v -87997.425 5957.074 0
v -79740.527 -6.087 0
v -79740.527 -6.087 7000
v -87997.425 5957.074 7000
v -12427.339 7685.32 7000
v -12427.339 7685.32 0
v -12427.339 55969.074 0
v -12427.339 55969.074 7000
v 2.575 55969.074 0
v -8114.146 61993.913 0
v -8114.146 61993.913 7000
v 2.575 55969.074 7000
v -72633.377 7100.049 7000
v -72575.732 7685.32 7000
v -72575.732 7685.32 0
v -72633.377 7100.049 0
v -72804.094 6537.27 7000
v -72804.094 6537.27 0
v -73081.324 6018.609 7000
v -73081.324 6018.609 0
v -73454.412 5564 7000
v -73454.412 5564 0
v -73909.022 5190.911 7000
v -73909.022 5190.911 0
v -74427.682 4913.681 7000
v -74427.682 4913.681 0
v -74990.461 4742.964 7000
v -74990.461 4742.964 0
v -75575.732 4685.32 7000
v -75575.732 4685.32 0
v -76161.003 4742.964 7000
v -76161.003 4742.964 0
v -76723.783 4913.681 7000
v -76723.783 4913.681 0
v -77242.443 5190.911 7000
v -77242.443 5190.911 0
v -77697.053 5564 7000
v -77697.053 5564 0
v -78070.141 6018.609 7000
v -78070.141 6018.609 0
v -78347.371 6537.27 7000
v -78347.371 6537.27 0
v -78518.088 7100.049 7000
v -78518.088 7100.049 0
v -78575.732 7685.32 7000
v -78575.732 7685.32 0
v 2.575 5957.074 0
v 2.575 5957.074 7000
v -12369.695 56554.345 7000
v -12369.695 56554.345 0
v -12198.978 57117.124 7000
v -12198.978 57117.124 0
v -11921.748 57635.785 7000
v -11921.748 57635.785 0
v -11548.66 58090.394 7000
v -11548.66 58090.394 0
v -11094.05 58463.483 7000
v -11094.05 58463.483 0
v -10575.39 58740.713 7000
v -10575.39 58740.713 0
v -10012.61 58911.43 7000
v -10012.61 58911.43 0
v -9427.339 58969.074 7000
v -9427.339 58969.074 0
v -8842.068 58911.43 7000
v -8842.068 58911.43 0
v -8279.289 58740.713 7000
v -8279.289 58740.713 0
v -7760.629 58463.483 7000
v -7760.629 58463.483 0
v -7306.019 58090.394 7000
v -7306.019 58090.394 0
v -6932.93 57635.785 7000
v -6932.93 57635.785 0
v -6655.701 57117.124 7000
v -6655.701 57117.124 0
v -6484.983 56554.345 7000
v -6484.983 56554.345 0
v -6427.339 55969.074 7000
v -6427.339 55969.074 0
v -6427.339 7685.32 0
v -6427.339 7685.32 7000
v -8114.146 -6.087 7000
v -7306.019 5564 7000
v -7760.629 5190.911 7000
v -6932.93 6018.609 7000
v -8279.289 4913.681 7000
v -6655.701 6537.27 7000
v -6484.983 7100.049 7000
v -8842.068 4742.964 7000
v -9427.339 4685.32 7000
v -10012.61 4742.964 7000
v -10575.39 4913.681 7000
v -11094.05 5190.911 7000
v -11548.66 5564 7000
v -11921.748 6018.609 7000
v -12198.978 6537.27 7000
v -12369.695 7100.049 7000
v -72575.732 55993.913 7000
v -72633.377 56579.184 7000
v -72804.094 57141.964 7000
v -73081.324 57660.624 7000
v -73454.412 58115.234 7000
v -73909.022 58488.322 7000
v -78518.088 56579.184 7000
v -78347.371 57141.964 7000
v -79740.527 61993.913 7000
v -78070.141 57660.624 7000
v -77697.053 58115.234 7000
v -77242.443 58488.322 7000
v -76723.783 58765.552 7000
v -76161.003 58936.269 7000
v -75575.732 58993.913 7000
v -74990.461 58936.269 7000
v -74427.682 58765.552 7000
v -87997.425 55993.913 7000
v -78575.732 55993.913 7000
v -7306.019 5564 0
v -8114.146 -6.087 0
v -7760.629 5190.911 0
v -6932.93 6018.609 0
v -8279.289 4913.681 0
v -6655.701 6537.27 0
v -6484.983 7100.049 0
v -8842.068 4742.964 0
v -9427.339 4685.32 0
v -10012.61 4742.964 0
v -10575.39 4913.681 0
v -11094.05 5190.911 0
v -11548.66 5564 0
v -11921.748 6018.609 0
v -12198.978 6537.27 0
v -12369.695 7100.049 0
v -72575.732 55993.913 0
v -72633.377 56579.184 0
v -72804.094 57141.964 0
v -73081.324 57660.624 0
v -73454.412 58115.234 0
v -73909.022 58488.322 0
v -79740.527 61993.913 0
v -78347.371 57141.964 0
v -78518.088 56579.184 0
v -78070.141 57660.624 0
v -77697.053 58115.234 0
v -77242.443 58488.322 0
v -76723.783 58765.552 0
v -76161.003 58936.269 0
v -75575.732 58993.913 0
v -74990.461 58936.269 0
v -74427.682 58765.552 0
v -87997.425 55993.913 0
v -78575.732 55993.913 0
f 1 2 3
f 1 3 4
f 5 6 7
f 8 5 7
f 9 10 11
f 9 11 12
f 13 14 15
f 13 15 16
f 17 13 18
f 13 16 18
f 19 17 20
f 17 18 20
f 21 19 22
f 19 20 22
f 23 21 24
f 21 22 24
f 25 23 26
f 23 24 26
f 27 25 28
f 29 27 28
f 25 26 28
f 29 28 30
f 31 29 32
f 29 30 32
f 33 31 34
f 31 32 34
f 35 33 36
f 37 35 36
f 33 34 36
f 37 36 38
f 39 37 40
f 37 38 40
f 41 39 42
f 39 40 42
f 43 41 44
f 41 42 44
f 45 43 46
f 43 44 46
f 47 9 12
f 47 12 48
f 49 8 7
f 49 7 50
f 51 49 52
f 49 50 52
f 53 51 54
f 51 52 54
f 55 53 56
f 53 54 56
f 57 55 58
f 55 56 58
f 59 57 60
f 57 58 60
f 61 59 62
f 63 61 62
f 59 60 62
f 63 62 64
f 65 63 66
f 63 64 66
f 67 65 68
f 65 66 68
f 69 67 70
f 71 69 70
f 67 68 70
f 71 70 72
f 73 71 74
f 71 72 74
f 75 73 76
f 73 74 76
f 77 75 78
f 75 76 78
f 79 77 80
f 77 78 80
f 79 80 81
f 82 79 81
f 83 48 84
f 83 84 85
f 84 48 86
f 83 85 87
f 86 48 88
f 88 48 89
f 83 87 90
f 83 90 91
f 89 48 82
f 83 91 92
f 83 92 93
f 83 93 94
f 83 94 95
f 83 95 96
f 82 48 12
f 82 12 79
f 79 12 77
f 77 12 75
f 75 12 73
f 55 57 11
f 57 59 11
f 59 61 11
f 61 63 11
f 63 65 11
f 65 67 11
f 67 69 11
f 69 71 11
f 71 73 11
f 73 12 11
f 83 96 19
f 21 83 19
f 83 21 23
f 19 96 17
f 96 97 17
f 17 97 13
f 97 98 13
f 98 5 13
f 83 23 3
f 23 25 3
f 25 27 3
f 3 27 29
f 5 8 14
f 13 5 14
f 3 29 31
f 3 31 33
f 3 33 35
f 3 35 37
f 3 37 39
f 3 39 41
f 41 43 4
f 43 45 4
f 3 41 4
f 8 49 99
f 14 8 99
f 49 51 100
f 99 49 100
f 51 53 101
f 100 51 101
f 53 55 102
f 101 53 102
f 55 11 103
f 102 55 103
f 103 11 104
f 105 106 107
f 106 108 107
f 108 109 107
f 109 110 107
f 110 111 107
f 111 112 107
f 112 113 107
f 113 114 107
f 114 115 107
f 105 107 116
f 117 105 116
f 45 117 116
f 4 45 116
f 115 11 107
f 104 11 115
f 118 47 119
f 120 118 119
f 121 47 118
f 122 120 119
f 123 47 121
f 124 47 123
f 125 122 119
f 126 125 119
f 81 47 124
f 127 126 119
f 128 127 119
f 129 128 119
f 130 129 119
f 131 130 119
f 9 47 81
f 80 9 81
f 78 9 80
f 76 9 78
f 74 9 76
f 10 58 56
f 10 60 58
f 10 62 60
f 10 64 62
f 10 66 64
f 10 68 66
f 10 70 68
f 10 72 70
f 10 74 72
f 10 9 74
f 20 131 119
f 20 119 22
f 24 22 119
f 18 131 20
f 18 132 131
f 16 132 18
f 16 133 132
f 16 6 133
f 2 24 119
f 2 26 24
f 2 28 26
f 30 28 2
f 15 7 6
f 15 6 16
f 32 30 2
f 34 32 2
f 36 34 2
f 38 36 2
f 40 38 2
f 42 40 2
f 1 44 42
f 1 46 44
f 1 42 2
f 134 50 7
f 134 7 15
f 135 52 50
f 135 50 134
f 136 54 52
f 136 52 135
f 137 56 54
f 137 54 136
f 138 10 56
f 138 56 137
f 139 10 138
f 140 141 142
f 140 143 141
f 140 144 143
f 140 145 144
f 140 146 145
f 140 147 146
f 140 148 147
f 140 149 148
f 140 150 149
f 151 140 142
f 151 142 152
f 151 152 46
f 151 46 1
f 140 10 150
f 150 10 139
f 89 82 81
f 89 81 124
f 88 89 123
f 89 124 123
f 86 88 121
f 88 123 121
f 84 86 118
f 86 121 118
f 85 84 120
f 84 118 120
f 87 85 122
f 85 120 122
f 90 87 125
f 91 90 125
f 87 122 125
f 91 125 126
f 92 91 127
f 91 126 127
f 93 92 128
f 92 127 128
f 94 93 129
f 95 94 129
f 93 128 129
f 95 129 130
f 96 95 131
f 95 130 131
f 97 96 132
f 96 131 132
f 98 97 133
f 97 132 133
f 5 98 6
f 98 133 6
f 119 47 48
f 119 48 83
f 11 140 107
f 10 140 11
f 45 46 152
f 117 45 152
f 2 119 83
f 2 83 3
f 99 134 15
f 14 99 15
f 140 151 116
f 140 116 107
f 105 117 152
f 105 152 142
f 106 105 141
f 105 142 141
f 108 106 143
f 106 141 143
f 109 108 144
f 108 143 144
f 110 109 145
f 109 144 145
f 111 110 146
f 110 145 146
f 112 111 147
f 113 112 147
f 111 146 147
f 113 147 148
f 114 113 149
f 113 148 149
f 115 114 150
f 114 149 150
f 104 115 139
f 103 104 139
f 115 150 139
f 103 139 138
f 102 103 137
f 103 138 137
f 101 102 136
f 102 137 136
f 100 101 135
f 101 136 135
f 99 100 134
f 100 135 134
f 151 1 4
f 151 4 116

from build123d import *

# Parameters (mm, degrees)
BOSS_EXTRUDE1_DEPTH = 7000


with BuildPart() as part:
    # Sketch1 → Boss-Extrude1 (new body)
    with BuildSketch(Plane.XY):
        Polygon((-79740.527004551, 61993.913364055), (-8114.145758192, 61993.913364055), (2.575115207, 55969.074099511), (2.575115207, 5957.074352856), (-8114.145758192, -6.086635945), (-79740.527004551, -6.086635945), (-87997.424884793, 5957.074352856), (-87997.424884793, 55993.913364055), align=None)
        with BuildLine():
            Line((-72575.73242965, 55993.913364055), (-72575.73242965, 7685.319886443))
            ThreePointArc((-72575.73242965, 7685.319886443), (-75575.73242965, 4685.319886443), (-78575.73242965, 7685.319886443))
            Line((-78575.73242965, 7685.319886443), (-78575.73242965, 55993.913364055))
            ThreePointArc((-78575.73242965, 55993.913364055), (-75575.73242965, 58993.913364055), (-72575.73242965, 55993.913364055))
        make_face(mode=Mode.SUBTRACT)
        with BuildLine():
            Line((-6427.339306355, 55969.074099511), (-6427.339306355, 7685.319886443))
            ThreePointArc((-6427.339306355, 7685.319886443), (-9427.339306355, 4685.319886443), (-12427.339306355, 7685.319886443))
            Line((-12427.339306355, 7685.319886443), (-12427.339306355, 55969.074099511))
            ThreePointArc((-12427.339306355, 55969.074099511), (-9427.339306355, 58969.074099511), (-6427.339306355, 55969.074099511))
        make_face(mode=Mode.SUBTRACT)
    extrude(amount=BOSS_EXTRUDE1_DEPTH)


solid = part.part
